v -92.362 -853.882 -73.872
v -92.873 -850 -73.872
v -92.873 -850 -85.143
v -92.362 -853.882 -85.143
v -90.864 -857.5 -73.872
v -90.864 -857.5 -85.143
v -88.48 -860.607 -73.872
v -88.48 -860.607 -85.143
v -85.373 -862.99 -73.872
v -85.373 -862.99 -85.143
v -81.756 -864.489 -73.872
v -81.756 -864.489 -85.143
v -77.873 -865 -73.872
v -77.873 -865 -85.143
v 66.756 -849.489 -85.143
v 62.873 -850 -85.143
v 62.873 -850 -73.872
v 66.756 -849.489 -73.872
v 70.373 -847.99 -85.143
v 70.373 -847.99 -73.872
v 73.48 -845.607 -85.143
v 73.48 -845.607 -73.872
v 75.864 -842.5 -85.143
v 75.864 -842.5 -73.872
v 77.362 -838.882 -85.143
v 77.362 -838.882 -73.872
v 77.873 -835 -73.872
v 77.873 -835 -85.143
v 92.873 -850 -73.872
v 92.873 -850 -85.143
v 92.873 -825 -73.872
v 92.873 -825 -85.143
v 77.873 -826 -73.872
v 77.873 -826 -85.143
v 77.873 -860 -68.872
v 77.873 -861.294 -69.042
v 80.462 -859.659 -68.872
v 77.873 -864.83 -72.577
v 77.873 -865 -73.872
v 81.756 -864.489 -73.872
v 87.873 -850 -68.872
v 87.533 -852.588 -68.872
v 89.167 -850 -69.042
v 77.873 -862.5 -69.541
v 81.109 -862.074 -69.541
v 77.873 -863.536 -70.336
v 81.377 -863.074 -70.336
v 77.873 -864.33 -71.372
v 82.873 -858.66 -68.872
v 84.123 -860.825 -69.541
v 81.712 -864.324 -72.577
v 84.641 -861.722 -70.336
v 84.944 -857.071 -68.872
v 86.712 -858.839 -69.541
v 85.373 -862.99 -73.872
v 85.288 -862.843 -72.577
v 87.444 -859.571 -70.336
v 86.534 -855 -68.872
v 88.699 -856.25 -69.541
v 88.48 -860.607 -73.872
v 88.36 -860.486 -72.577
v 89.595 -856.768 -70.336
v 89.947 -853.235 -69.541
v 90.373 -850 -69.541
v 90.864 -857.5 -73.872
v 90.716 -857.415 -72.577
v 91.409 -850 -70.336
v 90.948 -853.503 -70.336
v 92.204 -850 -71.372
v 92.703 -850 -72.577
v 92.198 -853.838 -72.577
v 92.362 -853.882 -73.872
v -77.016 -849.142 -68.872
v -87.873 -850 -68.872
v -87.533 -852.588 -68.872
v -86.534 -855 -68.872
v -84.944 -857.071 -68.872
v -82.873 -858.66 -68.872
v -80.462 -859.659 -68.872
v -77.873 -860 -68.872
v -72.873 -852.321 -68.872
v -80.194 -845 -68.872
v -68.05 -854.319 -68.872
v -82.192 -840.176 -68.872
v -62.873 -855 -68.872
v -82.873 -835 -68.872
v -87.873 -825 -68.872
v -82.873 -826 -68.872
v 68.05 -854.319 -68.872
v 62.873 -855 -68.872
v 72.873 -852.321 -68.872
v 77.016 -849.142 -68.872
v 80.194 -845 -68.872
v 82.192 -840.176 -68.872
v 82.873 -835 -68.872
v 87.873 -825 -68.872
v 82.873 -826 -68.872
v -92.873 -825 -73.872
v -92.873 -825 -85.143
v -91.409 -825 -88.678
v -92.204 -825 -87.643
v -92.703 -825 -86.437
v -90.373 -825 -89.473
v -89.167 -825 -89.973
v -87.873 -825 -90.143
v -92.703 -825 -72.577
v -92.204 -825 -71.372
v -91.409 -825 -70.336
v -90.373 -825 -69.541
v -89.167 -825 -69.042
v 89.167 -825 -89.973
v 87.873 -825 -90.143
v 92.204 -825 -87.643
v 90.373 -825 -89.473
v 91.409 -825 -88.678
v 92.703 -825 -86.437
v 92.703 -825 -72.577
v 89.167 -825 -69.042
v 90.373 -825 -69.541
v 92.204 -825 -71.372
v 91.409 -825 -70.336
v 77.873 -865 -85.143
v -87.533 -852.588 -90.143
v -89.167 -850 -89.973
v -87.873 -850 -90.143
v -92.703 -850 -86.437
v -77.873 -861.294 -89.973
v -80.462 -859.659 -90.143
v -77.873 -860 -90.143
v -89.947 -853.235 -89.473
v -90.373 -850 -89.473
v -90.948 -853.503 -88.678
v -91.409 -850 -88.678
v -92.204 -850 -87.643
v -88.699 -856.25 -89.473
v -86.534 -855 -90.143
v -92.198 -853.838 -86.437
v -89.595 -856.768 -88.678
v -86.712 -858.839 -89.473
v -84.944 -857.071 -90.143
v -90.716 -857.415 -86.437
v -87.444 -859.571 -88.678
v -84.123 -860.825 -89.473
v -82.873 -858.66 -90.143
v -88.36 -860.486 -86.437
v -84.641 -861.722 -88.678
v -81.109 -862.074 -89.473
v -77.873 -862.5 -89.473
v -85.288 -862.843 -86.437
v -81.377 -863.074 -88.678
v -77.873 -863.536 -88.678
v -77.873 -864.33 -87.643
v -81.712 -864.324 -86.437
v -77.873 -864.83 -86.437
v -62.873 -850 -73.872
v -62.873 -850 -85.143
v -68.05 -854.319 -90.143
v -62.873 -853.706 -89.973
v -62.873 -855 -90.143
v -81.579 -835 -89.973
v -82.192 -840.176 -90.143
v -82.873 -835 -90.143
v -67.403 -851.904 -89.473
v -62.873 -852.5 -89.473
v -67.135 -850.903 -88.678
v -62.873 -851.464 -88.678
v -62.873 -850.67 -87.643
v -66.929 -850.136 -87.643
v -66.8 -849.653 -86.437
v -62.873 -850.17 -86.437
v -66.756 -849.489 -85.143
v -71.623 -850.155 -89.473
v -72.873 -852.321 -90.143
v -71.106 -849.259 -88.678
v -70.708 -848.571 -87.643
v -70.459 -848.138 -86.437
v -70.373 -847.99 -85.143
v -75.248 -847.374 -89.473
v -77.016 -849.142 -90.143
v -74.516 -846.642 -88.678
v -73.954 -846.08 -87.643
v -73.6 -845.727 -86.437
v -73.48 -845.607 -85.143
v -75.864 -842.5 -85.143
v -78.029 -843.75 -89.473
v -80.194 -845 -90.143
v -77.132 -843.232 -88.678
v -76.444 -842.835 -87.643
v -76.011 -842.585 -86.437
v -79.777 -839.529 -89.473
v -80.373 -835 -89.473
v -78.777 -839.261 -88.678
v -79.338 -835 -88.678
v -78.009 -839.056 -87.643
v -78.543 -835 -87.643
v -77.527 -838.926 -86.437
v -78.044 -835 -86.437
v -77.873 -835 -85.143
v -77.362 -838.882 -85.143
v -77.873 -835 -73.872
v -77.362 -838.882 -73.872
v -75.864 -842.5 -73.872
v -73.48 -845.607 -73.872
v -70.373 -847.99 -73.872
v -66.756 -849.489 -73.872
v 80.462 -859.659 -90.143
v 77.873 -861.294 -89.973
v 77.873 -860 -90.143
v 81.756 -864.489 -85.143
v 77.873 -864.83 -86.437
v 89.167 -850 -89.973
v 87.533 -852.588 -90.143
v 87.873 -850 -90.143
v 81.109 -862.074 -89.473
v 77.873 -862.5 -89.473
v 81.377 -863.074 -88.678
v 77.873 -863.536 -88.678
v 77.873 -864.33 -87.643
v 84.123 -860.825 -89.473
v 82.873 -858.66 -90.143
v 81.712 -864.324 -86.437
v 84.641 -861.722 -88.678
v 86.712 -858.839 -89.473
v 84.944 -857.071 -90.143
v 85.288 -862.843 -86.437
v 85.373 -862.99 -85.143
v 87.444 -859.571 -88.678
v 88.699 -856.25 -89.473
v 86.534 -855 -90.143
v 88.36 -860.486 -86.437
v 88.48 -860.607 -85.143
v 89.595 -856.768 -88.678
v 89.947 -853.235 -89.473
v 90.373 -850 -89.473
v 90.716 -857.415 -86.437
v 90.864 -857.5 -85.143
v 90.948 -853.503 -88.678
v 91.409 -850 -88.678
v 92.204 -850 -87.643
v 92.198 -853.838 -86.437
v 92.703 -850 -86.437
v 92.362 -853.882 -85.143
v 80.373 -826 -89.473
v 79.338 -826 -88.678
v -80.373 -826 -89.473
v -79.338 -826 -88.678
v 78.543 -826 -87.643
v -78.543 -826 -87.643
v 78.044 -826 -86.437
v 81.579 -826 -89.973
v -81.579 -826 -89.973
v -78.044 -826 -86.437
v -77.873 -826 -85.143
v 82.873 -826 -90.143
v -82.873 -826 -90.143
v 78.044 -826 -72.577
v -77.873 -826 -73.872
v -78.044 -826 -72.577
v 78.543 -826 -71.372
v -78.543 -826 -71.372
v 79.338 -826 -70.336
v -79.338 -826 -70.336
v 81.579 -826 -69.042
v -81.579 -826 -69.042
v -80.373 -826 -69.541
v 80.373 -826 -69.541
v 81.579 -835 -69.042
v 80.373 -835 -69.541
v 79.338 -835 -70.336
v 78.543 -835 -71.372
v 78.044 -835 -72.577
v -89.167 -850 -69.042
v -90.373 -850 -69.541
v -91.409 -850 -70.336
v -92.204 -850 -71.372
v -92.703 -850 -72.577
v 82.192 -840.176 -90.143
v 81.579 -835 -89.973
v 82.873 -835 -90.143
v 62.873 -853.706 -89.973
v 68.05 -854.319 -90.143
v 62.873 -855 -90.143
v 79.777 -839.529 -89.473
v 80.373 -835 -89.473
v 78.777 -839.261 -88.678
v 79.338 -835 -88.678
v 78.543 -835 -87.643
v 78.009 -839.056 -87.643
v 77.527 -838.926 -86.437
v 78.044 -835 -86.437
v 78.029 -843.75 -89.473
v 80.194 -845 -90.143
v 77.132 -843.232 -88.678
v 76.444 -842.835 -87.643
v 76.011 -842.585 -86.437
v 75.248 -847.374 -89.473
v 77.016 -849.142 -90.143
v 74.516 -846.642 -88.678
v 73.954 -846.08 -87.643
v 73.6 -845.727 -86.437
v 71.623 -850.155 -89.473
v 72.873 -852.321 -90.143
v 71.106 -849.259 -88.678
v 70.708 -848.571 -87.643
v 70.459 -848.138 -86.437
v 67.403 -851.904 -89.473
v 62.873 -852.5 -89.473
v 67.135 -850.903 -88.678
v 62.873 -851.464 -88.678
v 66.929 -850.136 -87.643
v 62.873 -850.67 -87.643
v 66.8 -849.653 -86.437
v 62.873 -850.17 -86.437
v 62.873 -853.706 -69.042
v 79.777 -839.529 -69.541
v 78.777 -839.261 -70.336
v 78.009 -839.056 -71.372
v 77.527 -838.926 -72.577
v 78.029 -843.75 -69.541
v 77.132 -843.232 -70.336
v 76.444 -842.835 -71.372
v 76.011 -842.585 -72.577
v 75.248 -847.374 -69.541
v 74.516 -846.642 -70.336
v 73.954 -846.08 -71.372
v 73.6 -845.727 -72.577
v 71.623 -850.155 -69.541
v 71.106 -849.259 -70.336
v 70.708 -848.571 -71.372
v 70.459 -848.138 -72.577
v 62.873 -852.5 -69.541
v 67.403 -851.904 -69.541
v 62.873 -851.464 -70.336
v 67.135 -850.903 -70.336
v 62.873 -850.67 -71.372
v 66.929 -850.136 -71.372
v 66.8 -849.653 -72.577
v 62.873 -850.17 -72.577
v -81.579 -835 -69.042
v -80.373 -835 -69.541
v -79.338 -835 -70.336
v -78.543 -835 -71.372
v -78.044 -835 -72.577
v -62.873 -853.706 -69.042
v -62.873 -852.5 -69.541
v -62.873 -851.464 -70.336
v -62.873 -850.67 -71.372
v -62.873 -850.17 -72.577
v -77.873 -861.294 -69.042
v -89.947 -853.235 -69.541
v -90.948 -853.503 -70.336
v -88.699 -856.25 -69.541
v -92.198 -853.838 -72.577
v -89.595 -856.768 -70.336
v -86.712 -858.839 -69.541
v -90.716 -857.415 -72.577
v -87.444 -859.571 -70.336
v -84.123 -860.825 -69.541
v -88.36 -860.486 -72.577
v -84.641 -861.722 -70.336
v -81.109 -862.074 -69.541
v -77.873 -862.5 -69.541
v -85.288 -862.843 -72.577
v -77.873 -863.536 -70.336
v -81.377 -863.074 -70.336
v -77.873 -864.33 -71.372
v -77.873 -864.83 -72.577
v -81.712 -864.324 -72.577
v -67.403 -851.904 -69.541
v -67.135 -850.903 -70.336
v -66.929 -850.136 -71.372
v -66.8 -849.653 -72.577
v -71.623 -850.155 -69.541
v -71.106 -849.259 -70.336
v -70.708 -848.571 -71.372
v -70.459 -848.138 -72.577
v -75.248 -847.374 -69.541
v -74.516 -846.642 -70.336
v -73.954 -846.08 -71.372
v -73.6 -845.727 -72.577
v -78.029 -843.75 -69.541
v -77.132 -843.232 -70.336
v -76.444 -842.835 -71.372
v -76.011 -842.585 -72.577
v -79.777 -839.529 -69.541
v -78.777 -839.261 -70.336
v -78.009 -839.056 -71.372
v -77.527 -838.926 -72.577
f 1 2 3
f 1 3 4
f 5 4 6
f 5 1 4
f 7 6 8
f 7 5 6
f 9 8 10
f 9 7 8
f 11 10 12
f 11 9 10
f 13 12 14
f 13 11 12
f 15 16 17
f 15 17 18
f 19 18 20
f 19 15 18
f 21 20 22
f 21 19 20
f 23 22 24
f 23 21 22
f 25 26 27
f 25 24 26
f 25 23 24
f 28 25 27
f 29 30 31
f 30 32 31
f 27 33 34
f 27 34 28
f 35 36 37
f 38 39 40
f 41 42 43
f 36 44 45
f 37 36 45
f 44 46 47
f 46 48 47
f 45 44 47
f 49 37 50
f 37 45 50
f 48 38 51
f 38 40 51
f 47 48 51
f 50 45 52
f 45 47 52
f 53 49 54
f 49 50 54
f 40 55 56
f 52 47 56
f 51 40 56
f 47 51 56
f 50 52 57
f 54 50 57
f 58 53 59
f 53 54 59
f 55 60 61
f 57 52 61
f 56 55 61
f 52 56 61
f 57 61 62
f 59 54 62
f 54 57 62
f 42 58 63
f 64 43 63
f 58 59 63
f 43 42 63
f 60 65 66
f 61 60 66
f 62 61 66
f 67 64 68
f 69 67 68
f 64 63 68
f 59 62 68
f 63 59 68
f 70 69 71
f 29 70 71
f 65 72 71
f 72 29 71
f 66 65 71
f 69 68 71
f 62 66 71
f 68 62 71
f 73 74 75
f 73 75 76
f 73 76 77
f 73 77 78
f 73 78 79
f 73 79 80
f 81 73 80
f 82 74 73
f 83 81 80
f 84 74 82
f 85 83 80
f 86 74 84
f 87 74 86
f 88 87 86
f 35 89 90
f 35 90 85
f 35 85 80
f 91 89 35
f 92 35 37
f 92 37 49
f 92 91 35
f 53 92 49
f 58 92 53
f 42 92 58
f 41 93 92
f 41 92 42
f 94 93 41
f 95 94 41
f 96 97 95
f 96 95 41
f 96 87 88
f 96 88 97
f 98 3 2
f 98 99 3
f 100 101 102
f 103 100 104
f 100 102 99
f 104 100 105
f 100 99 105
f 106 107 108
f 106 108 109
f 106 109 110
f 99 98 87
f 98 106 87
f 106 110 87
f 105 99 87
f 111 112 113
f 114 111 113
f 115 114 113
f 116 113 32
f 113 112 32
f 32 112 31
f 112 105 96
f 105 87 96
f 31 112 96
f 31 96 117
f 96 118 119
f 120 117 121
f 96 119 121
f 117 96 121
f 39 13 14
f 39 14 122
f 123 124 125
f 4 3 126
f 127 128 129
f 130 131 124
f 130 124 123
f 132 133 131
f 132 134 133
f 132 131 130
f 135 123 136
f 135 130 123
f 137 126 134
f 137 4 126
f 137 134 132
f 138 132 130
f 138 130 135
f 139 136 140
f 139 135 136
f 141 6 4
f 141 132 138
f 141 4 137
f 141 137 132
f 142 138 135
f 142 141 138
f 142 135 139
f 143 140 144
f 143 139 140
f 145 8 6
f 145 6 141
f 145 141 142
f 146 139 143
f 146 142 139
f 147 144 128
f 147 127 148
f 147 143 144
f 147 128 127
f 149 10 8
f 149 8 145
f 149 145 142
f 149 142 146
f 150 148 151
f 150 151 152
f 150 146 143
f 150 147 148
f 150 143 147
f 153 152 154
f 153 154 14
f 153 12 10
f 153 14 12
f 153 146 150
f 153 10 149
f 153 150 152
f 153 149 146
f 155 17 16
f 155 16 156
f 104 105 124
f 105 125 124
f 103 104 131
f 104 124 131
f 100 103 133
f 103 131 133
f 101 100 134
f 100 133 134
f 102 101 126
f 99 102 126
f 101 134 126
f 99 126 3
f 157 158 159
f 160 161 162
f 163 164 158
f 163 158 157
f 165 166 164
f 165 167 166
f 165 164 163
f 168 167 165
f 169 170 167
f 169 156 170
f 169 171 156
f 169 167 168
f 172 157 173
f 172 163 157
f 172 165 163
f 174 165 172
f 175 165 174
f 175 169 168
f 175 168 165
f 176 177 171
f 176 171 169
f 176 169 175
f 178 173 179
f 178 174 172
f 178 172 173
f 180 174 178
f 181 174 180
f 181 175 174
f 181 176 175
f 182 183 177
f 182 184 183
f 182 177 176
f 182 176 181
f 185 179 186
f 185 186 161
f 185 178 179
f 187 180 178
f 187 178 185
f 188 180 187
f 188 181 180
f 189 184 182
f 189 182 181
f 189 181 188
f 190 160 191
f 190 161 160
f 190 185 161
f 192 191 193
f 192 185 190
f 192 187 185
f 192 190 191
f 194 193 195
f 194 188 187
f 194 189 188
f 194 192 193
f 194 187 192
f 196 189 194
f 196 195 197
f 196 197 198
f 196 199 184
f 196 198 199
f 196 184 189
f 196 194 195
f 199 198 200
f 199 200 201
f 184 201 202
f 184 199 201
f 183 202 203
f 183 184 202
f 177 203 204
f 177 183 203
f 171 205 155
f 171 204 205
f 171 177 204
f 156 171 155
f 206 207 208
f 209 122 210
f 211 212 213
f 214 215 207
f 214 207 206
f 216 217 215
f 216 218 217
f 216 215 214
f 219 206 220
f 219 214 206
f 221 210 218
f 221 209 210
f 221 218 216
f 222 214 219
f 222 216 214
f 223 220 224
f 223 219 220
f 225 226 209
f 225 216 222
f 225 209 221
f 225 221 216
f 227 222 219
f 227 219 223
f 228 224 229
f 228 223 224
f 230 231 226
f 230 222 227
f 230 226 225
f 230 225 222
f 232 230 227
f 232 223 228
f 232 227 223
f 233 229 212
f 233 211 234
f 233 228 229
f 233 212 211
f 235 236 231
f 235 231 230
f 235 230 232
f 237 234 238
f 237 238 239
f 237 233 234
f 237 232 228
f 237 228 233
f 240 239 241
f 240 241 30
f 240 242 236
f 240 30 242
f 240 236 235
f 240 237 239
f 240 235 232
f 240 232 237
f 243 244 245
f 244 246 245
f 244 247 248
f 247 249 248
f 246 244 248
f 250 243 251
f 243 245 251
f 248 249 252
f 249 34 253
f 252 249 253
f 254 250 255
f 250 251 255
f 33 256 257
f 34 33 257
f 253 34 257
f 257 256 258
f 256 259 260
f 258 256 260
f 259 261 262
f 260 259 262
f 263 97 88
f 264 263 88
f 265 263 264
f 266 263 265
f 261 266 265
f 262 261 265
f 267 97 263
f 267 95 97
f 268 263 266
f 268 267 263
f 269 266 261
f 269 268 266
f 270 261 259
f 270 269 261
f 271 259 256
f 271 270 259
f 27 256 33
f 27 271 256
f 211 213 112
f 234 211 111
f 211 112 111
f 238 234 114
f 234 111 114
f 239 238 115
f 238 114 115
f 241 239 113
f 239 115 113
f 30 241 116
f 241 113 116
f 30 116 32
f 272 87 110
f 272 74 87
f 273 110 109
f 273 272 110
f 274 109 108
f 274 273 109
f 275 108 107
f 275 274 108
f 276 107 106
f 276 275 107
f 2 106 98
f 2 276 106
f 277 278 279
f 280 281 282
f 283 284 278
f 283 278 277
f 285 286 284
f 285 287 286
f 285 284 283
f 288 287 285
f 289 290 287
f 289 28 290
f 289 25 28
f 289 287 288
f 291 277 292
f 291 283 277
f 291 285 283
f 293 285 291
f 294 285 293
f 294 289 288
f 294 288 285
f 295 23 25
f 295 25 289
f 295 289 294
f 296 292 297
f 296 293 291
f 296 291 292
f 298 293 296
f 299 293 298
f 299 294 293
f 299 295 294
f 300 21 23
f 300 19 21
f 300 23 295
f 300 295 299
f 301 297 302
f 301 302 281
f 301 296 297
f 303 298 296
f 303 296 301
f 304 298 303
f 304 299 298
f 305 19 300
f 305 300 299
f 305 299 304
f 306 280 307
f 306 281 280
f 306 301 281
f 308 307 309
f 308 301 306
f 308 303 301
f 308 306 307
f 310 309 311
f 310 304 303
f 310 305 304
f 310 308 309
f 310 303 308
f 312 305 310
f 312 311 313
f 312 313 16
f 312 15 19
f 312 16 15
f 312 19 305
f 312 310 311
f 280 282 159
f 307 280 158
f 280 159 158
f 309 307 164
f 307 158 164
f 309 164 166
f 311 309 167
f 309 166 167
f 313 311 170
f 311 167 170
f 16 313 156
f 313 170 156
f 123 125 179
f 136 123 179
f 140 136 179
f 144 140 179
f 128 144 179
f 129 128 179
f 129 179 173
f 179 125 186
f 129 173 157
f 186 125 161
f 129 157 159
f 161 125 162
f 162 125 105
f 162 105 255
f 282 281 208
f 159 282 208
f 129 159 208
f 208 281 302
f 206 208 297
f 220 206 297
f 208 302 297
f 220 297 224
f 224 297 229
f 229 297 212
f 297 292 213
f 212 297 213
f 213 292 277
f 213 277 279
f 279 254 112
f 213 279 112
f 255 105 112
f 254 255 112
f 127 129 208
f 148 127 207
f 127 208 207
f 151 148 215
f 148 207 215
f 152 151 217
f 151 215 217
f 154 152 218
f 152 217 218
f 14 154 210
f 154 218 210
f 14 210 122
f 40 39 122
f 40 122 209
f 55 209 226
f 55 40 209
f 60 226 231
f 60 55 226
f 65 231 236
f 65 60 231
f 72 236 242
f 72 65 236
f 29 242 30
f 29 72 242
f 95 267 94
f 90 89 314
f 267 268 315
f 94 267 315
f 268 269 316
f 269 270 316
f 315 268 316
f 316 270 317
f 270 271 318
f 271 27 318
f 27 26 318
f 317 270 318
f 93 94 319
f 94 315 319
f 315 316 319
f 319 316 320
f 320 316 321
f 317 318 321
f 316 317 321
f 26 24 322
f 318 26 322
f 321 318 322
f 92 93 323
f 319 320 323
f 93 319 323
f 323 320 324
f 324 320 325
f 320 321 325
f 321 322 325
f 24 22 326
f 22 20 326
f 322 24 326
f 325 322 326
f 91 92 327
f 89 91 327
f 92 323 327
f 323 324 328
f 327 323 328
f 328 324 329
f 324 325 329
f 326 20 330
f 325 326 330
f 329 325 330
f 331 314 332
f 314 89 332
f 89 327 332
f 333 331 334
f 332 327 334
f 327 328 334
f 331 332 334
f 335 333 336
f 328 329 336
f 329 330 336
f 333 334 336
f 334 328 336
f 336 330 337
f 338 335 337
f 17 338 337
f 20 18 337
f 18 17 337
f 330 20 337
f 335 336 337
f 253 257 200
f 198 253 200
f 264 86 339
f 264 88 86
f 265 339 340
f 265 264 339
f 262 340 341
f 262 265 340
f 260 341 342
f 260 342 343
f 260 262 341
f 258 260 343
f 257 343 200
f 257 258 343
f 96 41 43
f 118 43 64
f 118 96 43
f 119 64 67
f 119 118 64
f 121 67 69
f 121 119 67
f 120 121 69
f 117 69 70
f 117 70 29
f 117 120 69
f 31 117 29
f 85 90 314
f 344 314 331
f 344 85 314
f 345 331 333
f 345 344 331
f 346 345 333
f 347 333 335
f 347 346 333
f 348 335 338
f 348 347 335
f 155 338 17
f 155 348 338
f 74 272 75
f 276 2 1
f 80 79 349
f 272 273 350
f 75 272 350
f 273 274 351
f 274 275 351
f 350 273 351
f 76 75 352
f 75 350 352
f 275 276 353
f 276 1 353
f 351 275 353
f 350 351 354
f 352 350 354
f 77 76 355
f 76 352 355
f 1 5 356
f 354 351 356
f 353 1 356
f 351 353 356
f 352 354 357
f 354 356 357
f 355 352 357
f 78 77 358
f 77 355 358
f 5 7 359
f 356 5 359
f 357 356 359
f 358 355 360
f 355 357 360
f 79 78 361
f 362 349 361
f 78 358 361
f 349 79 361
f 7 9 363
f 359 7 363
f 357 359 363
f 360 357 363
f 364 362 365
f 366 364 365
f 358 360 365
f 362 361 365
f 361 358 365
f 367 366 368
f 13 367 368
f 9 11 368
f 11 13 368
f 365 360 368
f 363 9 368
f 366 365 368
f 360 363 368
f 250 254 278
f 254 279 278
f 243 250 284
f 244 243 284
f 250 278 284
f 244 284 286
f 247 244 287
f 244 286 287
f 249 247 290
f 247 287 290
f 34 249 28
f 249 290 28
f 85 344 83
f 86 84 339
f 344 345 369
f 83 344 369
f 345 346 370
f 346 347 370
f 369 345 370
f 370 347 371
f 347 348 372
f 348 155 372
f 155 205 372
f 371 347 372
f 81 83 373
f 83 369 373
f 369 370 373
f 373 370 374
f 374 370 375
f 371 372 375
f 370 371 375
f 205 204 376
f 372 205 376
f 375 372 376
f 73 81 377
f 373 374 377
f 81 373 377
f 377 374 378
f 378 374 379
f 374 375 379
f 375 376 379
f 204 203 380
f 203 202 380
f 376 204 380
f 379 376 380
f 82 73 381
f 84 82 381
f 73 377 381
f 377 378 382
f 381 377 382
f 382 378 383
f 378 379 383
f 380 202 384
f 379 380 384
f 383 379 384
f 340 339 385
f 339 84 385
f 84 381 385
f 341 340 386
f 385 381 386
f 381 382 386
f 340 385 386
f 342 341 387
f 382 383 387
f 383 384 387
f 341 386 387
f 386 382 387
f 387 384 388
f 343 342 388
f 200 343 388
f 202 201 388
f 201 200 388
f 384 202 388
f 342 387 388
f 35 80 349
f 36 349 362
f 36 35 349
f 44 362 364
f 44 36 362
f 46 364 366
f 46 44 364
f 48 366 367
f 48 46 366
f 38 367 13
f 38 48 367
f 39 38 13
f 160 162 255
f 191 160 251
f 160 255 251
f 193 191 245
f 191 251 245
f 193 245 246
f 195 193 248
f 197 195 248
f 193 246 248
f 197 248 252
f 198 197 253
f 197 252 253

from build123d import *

# Parameters (mm, degrees)
SKETCH008_W     = 185.746766
SKETCH008_H     = 21.2714
PAD006_DEPTH    = 40
SKETCH009_W     = 155.746766
SKETCH009_H     = 24
POCKET002_DEPTH = 21.2724
FILLET_R        = 15
FILLET001_R     = 5


with BuildPart() as part:
    # Sketch008 (on Face1 of CopyPocket001) → Pad006 (new body)
    with BuildSketch(Plane.XZ.offset(825)):
        with Locations((0, -79.507206)):
            Rectangle(SKETCH008_W, SKETCH008_H)
    extrude(amount=PAD006_DEPTH)

    # Sketch009 (on Face4 of Pad006) → Pocket002 (cut, through all)
    with BuildSketch(Plane(origin=(0, 0, -68.871506), x_dir=(-1, 0, 0), z_dir=(0, 0, 1))):
        with Locations((0, 838)):
            Rectangle(SKETCH009_W, SKETCH009_H)
    extrude(amount=-POCKET002_DEPTH, mode=Mode.SUBTRACT)

    # Fillet
    fillet_edges = [part.edges().sort_by_distance(p)[0] for p in [
        (77.873383, -850, -79.507206),
        (-77.873383, -850, -79.507206),
        (-92.873383, -865, -79.507206),
        (92.873383, -865, -79.507206),
    ]]
    fillet(fillet_edges, radius=FILLET_R)

    # Fillet001
    fillet001_edges = [part.edges().sort_by_distance(p)[0] for p in [
        (0, -865, -68.871506),
        (0, -865, -90.142906),
        (0, -850, -68.871506),
        (0, -850, -90.142906),
    ]]
    fillet(fillet001_edges, radius=FILLET001_R)


solid = part.part
